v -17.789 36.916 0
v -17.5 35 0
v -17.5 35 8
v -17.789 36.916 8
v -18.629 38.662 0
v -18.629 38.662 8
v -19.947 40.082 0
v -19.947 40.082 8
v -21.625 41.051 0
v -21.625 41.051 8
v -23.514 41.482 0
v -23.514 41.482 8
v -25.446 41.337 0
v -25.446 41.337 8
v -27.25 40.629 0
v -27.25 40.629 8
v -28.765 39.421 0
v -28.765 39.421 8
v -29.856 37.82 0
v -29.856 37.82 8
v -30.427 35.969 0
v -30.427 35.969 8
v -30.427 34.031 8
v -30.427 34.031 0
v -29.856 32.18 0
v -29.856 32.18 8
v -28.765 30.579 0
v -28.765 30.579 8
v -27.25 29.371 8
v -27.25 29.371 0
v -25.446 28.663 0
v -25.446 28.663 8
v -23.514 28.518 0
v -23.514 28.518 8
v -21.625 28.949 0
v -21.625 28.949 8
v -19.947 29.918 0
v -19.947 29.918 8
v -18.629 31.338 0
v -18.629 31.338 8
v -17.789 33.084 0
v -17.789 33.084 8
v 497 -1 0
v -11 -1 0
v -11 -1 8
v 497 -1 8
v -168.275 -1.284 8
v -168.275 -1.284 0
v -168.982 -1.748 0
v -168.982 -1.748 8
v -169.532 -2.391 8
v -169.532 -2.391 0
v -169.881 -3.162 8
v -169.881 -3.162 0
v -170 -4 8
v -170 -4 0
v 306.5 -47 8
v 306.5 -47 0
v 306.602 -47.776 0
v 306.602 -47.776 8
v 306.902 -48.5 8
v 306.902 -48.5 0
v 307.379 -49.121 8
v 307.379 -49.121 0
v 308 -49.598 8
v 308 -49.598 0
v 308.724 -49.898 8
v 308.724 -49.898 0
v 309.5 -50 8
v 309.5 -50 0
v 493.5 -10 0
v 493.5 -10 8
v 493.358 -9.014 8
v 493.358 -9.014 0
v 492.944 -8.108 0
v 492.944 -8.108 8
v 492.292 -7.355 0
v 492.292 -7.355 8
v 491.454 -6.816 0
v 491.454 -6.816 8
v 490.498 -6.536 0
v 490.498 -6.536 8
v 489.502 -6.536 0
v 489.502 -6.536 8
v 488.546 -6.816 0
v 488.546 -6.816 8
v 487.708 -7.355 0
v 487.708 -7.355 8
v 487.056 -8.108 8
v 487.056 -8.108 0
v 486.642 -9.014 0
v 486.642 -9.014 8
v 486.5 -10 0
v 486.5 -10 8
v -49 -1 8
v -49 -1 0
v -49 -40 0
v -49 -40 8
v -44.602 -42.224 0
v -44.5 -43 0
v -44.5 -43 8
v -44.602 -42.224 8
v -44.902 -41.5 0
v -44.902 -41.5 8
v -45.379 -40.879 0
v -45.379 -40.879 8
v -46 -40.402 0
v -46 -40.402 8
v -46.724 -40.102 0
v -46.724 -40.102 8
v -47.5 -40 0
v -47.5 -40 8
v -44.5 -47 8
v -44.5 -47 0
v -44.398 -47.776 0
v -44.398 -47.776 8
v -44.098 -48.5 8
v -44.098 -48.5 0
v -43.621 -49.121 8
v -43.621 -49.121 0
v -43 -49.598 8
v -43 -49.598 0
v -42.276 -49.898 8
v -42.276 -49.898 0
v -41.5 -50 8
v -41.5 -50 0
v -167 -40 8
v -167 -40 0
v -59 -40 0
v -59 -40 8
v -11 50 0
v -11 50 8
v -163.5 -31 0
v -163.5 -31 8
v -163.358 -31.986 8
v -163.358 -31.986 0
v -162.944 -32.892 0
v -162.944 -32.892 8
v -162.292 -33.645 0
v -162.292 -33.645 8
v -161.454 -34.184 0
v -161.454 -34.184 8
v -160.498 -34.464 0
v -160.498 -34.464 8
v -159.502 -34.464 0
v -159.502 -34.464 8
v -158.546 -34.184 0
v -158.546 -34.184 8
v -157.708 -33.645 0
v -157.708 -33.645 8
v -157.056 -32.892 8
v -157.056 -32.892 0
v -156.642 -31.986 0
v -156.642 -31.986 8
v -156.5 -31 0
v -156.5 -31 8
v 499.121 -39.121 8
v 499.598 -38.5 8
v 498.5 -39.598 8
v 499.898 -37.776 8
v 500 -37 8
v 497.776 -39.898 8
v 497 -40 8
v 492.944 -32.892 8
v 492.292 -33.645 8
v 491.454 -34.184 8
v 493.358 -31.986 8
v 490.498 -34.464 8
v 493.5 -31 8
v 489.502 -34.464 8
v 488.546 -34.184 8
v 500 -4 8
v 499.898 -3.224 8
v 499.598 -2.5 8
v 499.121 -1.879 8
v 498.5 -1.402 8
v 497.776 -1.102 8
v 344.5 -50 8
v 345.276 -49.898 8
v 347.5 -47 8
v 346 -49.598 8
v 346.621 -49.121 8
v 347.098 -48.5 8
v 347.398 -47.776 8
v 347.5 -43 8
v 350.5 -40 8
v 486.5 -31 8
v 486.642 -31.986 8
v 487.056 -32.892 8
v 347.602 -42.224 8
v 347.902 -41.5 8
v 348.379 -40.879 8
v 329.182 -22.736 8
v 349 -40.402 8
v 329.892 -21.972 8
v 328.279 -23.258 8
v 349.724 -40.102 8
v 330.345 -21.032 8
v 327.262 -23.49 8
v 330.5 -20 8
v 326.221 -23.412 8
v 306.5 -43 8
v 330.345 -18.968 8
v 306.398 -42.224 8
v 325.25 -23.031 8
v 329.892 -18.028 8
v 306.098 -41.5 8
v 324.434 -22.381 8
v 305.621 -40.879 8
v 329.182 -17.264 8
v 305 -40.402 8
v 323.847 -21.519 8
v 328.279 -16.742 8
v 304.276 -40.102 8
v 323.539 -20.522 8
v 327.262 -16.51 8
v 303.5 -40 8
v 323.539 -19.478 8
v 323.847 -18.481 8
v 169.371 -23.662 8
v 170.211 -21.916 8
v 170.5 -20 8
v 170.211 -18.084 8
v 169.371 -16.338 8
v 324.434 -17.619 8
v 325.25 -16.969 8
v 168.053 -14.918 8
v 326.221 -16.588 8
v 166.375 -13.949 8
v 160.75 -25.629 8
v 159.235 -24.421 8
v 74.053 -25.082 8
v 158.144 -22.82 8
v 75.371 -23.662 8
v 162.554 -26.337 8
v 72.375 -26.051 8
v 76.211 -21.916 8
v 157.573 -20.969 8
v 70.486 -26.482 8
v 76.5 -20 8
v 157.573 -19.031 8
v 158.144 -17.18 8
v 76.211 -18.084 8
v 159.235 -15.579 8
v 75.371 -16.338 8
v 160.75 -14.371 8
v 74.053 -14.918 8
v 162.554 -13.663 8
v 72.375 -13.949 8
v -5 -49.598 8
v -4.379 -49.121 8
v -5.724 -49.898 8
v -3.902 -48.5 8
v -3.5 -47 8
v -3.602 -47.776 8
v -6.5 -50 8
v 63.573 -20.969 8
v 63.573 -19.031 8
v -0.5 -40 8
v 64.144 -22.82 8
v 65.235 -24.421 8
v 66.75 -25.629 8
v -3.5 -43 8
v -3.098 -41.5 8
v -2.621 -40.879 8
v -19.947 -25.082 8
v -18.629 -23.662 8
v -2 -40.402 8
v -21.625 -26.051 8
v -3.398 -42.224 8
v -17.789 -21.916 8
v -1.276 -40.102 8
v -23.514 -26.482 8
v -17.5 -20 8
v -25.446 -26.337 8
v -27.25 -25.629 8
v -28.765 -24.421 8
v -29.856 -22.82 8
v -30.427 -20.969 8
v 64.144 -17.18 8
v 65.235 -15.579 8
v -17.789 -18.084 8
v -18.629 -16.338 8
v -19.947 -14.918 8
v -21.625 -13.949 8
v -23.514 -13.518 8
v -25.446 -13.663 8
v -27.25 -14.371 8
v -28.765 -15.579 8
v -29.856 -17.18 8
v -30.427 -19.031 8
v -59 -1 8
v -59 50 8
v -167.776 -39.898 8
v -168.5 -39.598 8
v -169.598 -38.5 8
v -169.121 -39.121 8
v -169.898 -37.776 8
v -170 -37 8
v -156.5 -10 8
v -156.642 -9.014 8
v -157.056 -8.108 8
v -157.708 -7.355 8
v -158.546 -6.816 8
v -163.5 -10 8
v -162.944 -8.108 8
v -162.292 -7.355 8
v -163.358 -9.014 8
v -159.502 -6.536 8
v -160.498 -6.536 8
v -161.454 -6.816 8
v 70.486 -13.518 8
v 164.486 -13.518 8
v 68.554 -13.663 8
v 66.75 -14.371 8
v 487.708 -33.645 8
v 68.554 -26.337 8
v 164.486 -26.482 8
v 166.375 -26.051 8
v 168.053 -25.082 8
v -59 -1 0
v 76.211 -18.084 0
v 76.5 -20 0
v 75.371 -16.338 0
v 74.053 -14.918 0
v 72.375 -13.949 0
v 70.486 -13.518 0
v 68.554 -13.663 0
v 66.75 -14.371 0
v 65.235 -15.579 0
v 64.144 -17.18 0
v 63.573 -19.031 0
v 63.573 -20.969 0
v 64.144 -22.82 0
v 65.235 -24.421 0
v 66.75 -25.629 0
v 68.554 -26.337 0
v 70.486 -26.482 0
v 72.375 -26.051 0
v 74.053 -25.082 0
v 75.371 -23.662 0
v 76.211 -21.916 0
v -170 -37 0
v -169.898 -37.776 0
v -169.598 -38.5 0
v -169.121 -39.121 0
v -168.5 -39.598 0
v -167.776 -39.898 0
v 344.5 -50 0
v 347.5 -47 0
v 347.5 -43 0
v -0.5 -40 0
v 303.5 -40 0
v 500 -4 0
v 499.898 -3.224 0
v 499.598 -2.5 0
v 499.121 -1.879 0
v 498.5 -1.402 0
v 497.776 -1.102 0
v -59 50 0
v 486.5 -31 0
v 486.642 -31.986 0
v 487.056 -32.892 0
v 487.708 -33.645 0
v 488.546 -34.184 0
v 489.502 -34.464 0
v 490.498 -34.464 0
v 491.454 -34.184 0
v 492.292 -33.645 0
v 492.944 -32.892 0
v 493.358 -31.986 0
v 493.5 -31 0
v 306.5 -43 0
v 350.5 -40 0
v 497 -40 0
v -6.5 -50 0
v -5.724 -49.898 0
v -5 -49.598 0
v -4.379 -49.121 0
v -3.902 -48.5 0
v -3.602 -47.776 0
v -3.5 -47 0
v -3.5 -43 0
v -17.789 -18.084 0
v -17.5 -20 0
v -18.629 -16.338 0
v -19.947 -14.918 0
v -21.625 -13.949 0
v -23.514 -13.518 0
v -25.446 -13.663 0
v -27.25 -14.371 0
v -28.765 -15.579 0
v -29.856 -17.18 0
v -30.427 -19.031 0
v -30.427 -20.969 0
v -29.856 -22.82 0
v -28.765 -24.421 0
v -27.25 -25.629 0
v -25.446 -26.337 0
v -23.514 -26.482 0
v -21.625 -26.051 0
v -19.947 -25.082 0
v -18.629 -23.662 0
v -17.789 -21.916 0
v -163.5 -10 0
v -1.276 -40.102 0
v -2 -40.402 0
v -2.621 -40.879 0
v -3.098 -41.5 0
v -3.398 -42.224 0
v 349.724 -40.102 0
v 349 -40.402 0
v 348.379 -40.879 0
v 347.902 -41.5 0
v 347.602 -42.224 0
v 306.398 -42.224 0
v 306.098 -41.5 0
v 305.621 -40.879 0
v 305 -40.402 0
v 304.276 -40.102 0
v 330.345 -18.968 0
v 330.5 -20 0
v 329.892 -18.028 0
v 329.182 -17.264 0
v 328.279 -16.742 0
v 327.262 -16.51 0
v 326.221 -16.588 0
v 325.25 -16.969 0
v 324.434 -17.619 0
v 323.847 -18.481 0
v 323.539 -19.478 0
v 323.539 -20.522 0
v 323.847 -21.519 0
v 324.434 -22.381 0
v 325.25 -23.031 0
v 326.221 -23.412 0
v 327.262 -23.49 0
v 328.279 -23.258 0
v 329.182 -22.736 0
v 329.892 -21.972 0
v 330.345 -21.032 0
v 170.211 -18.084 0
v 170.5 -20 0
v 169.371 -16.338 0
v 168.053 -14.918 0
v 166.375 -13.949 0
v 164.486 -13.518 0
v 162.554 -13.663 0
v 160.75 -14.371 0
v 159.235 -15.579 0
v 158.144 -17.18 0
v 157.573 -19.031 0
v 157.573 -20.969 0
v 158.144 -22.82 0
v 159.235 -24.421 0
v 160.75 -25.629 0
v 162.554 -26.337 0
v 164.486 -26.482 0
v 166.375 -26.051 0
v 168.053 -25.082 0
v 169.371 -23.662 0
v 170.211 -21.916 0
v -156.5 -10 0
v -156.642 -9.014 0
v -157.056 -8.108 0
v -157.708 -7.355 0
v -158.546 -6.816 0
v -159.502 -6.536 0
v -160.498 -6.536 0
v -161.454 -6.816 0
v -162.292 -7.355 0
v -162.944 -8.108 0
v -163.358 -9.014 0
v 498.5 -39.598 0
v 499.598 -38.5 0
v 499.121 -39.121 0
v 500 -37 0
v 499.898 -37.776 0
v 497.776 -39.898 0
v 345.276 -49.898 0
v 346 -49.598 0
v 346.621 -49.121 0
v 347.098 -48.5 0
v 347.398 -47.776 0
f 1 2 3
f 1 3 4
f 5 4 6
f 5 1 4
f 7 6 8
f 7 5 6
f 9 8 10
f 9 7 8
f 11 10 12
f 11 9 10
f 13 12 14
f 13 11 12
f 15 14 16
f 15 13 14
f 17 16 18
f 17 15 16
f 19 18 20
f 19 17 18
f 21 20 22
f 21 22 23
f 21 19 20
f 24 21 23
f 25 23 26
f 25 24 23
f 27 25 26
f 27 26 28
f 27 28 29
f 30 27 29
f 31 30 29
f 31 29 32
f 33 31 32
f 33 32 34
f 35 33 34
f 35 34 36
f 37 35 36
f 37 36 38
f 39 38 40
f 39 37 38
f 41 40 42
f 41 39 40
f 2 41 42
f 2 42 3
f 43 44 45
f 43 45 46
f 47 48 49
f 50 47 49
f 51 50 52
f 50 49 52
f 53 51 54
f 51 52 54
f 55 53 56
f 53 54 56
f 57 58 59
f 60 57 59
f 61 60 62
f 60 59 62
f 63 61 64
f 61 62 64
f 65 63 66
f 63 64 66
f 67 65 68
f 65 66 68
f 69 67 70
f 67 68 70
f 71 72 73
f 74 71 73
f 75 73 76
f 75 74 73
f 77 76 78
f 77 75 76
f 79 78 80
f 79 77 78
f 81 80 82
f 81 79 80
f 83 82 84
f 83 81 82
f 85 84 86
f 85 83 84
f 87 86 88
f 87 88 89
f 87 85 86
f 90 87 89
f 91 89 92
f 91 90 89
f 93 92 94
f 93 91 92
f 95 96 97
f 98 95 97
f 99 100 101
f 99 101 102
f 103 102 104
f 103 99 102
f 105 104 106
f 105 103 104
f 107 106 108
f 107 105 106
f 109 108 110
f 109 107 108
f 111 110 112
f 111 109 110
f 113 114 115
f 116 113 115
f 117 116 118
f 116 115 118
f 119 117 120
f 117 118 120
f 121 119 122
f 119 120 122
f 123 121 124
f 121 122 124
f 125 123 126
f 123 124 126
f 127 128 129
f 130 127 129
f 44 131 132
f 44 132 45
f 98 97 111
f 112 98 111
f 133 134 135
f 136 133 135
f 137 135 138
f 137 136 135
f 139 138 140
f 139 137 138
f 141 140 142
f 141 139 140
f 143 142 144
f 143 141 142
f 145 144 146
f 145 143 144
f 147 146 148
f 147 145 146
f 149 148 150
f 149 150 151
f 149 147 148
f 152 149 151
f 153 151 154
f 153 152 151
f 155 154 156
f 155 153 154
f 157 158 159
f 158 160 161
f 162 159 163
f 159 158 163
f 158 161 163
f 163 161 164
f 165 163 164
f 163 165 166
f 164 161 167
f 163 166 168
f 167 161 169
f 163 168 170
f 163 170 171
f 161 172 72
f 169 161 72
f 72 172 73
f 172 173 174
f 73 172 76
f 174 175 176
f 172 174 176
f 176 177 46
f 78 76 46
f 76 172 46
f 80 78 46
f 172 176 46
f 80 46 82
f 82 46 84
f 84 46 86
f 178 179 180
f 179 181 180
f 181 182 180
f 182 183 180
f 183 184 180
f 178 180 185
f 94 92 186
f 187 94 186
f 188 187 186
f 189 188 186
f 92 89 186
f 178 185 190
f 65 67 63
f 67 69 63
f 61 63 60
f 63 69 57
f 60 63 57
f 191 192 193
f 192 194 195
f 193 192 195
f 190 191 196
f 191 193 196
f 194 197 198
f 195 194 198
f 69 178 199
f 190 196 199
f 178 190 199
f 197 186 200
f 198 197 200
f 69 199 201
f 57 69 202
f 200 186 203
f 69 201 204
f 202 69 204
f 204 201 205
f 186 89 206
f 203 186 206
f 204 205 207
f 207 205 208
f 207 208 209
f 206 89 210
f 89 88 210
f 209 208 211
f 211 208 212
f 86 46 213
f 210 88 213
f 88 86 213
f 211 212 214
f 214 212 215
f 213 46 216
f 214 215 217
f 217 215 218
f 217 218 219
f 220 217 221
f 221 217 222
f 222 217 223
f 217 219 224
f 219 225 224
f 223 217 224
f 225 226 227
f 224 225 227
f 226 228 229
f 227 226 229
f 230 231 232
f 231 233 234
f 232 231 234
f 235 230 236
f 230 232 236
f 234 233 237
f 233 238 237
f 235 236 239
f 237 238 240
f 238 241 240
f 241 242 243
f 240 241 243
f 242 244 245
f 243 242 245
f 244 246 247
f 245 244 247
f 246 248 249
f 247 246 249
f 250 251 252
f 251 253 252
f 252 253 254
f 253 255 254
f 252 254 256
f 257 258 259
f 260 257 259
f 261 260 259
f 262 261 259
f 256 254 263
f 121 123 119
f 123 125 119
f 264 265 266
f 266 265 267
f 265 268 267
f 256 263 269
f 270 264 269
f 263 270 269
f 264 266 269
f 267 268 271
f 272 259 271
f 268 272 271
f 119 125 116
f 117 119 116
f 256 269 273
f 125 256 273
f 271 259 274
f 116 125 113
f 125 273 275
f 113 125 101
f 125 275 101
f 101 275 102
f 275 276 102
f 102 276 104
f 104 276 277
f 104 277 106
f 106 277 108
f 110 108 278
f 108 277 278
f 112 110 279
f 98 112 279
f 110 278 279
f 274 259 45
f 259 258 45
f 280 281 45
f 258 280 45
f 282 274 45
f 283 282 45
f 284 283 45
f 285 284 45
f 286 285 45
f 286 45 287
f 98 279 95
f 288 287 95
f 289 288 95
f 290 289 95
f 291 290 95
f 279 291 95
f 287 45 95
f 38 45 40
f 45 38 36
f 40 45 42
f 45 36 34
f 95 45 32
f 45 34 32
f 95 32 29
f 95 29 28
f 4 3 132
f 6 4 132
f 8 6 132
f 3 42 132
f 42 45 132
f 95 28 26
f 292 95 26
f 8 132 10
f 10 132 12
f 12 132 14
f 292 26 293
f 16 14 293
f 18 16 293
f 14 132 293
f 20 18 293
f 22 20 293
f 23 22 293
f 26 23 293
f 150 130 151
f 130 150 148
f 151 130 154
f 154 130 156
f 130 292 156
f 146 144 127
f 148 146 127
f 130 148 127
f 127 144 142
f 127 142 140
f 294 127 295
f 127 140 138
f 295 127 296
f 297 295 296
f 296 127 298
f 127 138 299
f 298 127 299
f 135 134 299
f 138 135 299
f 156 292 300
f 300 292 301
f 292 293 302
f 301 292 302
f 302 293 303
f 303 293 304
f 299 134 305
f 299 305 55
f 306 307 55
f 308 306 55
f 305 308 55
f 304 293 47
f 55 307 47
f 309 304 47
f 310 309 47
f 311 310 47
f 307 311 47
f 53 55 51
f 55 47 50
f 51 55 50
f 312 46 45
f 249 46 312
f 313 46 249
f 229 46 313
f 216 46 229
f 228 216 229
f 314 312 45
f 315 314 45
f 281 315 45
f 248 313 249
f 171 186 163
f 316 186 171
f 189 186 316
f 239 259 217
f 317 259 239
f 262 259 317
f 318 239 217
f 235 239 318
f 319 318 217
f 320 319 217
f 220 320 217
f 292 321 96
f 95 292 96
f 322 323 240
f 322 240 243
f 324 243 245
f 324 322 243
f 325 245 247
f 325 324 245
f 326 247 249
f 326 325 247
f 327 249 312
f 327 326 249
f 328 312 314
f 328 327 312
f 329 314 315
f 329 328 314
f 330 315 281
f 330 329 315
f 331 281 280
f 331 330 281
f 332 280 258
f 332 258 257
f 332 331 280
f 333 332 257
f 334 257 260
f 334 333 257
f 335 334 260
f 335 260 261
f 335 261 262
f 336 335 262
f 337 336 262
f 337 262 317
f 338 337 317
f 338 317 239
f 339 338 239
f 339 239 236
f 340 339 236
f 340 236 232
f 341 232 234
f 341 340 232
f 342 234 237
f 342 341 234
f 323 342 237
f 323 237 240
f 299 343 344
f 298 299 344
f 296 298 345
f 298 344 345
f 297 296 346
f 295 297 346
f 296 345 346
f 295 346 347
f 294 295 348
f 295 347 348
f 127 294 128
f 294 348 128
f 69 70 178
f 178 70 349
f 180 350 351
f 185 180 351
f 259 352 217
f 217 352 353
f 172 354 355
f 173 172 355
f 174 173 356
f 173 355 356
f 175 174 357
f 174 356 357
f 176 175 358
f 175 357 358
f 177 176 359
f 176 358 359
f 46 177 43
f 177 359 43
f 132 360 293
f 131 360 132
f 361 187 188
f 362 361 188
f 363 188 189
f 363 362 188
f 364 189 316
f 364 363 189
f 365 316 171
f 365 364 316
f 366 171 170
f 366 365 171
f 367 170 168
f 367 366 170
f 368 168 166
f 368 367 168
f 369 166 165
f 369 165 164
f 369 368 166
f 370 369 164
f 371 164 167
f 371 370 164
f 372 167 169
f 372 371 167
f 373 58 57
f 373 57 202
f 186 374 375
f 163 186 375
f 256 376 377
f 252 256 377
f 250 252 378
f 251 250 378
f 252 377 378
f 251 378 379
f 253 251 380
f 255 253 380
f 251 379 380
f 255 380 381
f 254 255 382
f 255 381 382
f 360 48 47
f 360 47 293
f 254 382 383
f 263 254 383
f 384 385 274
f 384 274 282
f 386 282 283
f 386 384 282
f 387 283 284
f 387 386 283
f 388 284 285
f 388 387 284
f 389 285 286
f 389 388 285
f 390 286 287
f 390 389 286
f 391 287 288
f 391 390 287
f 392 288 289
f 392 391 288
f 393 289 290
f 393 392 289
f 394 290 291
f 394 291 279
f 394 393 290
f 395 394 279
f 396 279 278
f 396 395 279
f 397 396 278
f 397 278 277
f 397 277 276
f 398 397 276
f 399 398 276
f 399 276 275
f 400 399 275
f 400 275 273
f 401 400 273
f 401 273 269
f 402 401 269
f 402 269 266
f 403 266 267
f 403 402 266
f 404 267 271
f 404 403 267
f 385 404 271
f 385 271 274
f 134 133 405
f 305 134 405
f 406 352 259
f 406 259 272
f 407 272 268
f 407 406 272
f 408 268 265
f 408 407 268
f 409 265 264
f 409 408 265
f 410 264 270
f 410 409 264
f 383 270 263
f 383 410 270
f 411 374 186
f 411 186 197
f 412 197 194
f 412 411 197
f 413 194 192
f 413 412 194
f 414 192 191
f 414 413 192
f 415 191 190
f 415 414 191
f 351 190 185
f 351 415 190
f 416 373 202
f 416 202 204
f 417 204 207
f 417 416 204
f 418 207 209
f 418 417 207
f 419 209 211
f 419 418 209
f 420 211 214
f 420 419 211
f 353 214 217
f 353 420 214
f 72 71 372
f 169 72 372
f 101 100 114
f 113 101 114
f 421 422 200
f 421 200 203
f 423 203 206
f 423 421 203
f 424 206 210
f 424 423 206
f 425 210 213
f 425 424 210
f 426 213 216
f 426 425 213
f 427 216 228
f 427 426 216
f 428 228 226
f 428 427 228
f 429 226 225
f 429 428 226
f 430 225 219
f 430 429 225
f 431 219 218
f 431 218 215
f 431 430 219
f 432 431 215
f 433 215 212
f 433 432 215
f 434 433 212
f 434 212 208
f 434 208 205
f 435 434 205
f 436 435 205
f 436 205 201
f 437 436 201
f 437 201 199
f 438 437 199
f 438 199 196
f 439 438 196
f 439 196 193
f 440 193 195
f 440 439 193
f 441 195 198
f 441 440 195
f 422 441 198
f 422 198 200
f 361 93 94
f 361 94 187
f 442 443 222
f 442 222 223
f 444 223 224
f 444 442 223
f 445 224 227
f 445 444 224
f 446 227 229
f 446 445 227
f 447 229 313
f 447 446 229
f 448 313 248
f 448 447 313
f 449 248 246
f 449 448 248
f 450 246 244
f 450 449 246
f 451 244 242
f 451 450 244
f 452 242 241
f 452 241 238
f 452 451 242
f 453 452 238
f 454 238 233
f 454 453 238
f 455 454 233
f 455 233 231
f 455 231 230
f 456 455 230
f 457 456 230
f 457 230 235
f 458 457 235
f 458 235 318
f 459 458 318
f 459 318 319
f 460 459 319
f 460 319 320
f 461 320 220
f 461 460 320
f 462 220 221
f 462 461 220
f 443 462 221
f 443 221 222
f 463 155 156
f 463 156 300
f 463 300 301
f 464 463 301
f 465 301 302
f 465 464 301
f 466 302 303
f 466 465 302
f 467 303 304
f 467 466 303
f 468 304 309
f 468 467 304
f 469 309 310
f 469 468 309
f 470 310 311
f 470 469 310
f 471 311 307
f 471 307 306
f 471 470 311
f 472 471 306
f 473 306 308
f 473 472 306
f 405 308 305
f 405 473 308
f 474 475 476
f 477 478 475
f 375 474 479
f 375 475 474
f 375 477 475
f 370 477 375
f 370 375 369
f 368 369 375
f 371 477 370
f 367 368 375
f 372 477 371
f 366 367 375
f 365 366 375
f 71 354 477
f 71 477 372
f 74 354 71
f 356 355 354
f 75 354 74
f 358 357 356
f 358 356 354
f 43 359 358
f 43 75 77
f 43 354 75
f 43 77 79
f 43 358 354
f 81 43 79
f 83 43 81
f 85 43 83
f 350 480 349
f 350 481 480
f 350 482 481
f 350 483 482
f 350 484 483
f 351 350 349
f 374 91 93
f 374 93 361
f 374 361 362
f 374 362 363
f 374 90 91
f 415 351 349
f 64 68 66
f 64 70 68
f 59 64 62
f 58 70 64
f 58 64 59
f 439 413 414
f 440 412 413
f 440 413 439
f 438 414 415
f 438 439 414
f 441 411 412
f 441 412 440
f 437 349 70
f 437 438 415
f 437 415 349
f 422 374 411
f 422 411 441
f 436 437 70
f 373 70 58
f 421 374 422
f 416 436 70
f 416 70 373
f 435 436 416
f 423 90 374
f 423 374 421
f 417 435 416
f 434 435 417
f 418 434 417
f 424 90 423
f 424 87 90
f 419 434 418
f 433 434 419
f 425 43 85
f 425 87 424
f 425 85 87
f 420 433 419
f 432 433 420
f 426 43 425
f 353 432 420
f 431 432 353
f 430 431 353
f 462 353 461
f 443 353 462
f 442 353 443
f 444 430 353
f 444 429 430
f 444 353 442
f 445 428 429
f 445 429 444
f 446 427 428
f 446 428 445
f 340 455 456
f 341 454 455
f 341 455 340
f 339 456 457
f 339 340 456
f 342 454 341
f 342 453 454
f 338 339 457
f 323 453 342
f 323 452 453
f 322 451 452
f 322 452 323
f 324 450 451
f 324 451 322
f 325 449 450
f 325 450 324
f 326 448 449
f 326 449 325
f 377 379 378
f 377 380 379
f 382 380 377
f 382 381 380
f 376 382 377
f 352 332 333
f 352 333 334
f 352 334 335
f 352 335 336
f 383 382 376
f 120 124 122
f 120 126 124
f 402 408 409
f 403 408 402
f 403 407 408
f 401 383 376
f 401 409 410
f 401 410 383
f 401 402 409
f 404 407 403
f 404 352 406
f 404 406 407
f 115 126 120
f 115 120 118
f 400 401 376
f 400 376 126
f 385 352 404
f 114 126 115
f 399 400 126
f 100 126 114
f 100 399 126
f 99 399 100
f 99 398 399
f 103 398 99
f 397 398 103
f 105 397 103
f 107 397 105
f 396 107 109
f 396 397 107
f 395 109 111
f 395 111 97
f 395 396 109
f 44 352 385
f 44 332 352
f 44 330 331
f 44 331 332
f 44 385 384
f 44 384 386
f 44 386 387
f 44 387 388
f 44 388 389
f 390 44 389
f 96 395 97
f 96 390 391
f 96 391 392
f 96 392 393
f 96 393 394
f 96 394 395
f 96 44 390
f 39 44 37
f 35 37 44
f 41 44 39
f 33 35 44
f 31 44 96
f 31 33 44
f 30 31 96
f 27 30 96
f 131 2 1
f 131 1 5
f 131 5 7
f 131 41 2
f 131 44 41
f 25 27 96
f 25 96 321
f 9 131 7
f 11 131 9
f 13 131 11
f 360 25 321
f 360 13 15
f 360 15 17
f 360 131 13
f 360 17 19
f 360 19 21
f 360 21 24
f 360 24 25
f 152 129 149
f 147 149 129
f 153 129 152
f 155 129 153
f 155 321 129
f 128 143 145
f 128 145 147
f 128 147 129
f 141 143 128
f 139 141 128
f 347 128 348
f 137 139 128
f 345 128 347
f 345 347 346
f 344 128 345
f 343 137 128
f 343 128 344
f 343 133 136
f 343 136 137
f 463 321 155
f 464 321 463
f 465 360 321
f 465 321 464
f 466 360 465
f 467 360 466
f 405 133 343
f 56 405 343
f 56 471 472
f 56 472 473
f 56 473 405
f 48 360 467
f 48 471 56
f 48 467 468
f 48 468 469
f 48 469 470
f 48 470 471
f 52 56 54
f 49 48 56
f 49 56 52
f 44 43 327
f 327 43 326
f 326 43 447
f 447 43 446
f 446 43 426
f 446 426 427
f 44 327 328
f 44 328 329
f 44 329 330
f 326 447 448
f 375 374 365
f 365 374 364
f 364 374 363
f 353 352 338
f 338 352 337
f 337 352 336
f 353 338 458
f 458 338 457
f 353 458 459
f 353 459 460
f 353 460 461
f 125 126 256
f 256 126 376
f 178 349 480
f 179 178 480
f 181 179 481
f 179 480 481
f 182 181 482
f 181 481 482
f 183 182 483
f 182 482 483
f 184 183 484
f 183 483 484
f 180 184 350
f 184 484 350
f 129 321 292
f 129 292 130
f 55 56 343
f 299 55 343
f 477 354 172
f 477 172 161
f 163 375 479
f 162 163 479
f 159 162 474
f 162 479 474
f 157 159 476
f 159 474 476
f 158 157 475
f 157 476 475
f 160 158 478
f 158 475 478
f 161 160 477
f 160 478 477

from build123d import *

# Parameters (mm, degrees)
SKETCH_R   = 6.5
SKETCH_R_2 = 3.5
PAD_DEPTH  = 8


with BuildPart() as part:
    # Sketch → Pad (new body)
    with BuildSketch(Plane.XY):
        with BuildLine():
            Line((-11, 50), (-11, -1))
            Line((-11, -1), (497, -1))
            ThreePointArc((500, -4), (499.12132, -1.87868), (497, -1))
            Line((500, -4), (500, -37))
            ThreePointArc((497, -40), (499.12132, -39.12132), (500, -37))
            Line((350.5, -40), (497, -40))
            ThreePointArc((350.5, -40), (348.37868, -40.87868), (347.5, -43))
            Line((347.5, -47), (347.5, -43))
            ThreePointArc((344.5, -50), (346.62132, -49.12132), (347.5, -47))
            Line((309.5, -50), (344.5, -50))
            ThreePointArc((306.5, -47), (307.37868, -49.12132), (309.5, -50))
            Line((306.5, -47), (306.5, -43))
            ThreePointArc((306.5, -43), (305.62132, -40.87868), (303.5, -40))
            Line((-0.5, -40), (303.5, -40))
            ThreePointArc((-0.5, -40), (-2.62132, -40.87868), (-3.5, -43))
            Line((-3.5, -47), (-3.5, -43))
            ThreePointArc((-6.5, -50), (-4.37868, -49.12132), (-3.5, -47))
            Line((-41.5, -50), (-6.5, -50))
            ThreePointArc((-44.5, -47), (-43.62132, -49.12132), (-41.5, -50))
            Line((-44.5, -43), (-44.5, -47))
            ThreePointArc((-44.5, -43), (-45.37868, -40.87868), (-47.5, -40))
            Line((-49, -40), (-47.5, -40))
            Line((-49, -1), (-49, -40))
            Line((-50, -1), (-49, -1))
            Line((-54, -1), (-50, -1))
            Line((-58, -1), (-54, -1))
            Line((-59, -1), (-58, -1))
            Line((-59, -1), (-59, -40))
            Line((-167, -40), (-59, -40))
            ThreePointArc((-170, -37), (-169.12132, -39.12132), (-167, -40))
            Line((-170, -4), (-170, -37))
            ThreePointArc((-168.27456, -1.284213), (-169.532161, -2.391224), (-170, -4))
            Line((-168.27456, -1.284213), (-59, 50))
            Line((-59, 50), (-58, 50))
            Line((-58, 50), (-54, 50))
            Line((-54, 50), (-50, 50))
            Line((-50, 50), (-49, 50))
            Line((-49, 50), (-11, 50))
        make_face()
        with Locations((-24, 35)):
            Circle(SKETCH_R, mode=Mode.SUBTRACT)
        with Locations((-24, -20)):
            Circle(SKETCH_R, mode=Mode.SUBTRACT)
        with Locations((164, -20)):
            Circle(SKETCH_R, mode=Mode.SUBTRACT)
        with Locations((70, -20)):
            Circle(SKETCH_R, mode=Mode.SUBTRACT)
        with Locations((327, -20)):
            Circle(SKETCH_R_2, mode=Mode.SUBTRACT)
        with BuildLine():
            ThreePointArc((493.5, -10), (490, -6.5), (486.5, -10))
            Line((486.5, -10), (486.5, -31))
            ThreePointArc((486.5, -31), (490, -34.5), (493.5, -31))
            Line((493.5, -10), (493.5, -31))
        make_face(mode=Mode.SUBTRACT)
        with BuildLine():
            ThreePointArc((-163.5, -31), (-160, -34.5), (-156.5, -31))
            Line((-156.5, -31), (-156.5, -10))
            ThreePointArc((-156.5, -10), (-160, -6.5), (-163.5, -10))
            Line((-163.5, -31), (-163.5, -10))
        make_face(mode=Mode.SUBTRACT)
    extrude(amount=PAD_DEPTH)


solid = part.part
